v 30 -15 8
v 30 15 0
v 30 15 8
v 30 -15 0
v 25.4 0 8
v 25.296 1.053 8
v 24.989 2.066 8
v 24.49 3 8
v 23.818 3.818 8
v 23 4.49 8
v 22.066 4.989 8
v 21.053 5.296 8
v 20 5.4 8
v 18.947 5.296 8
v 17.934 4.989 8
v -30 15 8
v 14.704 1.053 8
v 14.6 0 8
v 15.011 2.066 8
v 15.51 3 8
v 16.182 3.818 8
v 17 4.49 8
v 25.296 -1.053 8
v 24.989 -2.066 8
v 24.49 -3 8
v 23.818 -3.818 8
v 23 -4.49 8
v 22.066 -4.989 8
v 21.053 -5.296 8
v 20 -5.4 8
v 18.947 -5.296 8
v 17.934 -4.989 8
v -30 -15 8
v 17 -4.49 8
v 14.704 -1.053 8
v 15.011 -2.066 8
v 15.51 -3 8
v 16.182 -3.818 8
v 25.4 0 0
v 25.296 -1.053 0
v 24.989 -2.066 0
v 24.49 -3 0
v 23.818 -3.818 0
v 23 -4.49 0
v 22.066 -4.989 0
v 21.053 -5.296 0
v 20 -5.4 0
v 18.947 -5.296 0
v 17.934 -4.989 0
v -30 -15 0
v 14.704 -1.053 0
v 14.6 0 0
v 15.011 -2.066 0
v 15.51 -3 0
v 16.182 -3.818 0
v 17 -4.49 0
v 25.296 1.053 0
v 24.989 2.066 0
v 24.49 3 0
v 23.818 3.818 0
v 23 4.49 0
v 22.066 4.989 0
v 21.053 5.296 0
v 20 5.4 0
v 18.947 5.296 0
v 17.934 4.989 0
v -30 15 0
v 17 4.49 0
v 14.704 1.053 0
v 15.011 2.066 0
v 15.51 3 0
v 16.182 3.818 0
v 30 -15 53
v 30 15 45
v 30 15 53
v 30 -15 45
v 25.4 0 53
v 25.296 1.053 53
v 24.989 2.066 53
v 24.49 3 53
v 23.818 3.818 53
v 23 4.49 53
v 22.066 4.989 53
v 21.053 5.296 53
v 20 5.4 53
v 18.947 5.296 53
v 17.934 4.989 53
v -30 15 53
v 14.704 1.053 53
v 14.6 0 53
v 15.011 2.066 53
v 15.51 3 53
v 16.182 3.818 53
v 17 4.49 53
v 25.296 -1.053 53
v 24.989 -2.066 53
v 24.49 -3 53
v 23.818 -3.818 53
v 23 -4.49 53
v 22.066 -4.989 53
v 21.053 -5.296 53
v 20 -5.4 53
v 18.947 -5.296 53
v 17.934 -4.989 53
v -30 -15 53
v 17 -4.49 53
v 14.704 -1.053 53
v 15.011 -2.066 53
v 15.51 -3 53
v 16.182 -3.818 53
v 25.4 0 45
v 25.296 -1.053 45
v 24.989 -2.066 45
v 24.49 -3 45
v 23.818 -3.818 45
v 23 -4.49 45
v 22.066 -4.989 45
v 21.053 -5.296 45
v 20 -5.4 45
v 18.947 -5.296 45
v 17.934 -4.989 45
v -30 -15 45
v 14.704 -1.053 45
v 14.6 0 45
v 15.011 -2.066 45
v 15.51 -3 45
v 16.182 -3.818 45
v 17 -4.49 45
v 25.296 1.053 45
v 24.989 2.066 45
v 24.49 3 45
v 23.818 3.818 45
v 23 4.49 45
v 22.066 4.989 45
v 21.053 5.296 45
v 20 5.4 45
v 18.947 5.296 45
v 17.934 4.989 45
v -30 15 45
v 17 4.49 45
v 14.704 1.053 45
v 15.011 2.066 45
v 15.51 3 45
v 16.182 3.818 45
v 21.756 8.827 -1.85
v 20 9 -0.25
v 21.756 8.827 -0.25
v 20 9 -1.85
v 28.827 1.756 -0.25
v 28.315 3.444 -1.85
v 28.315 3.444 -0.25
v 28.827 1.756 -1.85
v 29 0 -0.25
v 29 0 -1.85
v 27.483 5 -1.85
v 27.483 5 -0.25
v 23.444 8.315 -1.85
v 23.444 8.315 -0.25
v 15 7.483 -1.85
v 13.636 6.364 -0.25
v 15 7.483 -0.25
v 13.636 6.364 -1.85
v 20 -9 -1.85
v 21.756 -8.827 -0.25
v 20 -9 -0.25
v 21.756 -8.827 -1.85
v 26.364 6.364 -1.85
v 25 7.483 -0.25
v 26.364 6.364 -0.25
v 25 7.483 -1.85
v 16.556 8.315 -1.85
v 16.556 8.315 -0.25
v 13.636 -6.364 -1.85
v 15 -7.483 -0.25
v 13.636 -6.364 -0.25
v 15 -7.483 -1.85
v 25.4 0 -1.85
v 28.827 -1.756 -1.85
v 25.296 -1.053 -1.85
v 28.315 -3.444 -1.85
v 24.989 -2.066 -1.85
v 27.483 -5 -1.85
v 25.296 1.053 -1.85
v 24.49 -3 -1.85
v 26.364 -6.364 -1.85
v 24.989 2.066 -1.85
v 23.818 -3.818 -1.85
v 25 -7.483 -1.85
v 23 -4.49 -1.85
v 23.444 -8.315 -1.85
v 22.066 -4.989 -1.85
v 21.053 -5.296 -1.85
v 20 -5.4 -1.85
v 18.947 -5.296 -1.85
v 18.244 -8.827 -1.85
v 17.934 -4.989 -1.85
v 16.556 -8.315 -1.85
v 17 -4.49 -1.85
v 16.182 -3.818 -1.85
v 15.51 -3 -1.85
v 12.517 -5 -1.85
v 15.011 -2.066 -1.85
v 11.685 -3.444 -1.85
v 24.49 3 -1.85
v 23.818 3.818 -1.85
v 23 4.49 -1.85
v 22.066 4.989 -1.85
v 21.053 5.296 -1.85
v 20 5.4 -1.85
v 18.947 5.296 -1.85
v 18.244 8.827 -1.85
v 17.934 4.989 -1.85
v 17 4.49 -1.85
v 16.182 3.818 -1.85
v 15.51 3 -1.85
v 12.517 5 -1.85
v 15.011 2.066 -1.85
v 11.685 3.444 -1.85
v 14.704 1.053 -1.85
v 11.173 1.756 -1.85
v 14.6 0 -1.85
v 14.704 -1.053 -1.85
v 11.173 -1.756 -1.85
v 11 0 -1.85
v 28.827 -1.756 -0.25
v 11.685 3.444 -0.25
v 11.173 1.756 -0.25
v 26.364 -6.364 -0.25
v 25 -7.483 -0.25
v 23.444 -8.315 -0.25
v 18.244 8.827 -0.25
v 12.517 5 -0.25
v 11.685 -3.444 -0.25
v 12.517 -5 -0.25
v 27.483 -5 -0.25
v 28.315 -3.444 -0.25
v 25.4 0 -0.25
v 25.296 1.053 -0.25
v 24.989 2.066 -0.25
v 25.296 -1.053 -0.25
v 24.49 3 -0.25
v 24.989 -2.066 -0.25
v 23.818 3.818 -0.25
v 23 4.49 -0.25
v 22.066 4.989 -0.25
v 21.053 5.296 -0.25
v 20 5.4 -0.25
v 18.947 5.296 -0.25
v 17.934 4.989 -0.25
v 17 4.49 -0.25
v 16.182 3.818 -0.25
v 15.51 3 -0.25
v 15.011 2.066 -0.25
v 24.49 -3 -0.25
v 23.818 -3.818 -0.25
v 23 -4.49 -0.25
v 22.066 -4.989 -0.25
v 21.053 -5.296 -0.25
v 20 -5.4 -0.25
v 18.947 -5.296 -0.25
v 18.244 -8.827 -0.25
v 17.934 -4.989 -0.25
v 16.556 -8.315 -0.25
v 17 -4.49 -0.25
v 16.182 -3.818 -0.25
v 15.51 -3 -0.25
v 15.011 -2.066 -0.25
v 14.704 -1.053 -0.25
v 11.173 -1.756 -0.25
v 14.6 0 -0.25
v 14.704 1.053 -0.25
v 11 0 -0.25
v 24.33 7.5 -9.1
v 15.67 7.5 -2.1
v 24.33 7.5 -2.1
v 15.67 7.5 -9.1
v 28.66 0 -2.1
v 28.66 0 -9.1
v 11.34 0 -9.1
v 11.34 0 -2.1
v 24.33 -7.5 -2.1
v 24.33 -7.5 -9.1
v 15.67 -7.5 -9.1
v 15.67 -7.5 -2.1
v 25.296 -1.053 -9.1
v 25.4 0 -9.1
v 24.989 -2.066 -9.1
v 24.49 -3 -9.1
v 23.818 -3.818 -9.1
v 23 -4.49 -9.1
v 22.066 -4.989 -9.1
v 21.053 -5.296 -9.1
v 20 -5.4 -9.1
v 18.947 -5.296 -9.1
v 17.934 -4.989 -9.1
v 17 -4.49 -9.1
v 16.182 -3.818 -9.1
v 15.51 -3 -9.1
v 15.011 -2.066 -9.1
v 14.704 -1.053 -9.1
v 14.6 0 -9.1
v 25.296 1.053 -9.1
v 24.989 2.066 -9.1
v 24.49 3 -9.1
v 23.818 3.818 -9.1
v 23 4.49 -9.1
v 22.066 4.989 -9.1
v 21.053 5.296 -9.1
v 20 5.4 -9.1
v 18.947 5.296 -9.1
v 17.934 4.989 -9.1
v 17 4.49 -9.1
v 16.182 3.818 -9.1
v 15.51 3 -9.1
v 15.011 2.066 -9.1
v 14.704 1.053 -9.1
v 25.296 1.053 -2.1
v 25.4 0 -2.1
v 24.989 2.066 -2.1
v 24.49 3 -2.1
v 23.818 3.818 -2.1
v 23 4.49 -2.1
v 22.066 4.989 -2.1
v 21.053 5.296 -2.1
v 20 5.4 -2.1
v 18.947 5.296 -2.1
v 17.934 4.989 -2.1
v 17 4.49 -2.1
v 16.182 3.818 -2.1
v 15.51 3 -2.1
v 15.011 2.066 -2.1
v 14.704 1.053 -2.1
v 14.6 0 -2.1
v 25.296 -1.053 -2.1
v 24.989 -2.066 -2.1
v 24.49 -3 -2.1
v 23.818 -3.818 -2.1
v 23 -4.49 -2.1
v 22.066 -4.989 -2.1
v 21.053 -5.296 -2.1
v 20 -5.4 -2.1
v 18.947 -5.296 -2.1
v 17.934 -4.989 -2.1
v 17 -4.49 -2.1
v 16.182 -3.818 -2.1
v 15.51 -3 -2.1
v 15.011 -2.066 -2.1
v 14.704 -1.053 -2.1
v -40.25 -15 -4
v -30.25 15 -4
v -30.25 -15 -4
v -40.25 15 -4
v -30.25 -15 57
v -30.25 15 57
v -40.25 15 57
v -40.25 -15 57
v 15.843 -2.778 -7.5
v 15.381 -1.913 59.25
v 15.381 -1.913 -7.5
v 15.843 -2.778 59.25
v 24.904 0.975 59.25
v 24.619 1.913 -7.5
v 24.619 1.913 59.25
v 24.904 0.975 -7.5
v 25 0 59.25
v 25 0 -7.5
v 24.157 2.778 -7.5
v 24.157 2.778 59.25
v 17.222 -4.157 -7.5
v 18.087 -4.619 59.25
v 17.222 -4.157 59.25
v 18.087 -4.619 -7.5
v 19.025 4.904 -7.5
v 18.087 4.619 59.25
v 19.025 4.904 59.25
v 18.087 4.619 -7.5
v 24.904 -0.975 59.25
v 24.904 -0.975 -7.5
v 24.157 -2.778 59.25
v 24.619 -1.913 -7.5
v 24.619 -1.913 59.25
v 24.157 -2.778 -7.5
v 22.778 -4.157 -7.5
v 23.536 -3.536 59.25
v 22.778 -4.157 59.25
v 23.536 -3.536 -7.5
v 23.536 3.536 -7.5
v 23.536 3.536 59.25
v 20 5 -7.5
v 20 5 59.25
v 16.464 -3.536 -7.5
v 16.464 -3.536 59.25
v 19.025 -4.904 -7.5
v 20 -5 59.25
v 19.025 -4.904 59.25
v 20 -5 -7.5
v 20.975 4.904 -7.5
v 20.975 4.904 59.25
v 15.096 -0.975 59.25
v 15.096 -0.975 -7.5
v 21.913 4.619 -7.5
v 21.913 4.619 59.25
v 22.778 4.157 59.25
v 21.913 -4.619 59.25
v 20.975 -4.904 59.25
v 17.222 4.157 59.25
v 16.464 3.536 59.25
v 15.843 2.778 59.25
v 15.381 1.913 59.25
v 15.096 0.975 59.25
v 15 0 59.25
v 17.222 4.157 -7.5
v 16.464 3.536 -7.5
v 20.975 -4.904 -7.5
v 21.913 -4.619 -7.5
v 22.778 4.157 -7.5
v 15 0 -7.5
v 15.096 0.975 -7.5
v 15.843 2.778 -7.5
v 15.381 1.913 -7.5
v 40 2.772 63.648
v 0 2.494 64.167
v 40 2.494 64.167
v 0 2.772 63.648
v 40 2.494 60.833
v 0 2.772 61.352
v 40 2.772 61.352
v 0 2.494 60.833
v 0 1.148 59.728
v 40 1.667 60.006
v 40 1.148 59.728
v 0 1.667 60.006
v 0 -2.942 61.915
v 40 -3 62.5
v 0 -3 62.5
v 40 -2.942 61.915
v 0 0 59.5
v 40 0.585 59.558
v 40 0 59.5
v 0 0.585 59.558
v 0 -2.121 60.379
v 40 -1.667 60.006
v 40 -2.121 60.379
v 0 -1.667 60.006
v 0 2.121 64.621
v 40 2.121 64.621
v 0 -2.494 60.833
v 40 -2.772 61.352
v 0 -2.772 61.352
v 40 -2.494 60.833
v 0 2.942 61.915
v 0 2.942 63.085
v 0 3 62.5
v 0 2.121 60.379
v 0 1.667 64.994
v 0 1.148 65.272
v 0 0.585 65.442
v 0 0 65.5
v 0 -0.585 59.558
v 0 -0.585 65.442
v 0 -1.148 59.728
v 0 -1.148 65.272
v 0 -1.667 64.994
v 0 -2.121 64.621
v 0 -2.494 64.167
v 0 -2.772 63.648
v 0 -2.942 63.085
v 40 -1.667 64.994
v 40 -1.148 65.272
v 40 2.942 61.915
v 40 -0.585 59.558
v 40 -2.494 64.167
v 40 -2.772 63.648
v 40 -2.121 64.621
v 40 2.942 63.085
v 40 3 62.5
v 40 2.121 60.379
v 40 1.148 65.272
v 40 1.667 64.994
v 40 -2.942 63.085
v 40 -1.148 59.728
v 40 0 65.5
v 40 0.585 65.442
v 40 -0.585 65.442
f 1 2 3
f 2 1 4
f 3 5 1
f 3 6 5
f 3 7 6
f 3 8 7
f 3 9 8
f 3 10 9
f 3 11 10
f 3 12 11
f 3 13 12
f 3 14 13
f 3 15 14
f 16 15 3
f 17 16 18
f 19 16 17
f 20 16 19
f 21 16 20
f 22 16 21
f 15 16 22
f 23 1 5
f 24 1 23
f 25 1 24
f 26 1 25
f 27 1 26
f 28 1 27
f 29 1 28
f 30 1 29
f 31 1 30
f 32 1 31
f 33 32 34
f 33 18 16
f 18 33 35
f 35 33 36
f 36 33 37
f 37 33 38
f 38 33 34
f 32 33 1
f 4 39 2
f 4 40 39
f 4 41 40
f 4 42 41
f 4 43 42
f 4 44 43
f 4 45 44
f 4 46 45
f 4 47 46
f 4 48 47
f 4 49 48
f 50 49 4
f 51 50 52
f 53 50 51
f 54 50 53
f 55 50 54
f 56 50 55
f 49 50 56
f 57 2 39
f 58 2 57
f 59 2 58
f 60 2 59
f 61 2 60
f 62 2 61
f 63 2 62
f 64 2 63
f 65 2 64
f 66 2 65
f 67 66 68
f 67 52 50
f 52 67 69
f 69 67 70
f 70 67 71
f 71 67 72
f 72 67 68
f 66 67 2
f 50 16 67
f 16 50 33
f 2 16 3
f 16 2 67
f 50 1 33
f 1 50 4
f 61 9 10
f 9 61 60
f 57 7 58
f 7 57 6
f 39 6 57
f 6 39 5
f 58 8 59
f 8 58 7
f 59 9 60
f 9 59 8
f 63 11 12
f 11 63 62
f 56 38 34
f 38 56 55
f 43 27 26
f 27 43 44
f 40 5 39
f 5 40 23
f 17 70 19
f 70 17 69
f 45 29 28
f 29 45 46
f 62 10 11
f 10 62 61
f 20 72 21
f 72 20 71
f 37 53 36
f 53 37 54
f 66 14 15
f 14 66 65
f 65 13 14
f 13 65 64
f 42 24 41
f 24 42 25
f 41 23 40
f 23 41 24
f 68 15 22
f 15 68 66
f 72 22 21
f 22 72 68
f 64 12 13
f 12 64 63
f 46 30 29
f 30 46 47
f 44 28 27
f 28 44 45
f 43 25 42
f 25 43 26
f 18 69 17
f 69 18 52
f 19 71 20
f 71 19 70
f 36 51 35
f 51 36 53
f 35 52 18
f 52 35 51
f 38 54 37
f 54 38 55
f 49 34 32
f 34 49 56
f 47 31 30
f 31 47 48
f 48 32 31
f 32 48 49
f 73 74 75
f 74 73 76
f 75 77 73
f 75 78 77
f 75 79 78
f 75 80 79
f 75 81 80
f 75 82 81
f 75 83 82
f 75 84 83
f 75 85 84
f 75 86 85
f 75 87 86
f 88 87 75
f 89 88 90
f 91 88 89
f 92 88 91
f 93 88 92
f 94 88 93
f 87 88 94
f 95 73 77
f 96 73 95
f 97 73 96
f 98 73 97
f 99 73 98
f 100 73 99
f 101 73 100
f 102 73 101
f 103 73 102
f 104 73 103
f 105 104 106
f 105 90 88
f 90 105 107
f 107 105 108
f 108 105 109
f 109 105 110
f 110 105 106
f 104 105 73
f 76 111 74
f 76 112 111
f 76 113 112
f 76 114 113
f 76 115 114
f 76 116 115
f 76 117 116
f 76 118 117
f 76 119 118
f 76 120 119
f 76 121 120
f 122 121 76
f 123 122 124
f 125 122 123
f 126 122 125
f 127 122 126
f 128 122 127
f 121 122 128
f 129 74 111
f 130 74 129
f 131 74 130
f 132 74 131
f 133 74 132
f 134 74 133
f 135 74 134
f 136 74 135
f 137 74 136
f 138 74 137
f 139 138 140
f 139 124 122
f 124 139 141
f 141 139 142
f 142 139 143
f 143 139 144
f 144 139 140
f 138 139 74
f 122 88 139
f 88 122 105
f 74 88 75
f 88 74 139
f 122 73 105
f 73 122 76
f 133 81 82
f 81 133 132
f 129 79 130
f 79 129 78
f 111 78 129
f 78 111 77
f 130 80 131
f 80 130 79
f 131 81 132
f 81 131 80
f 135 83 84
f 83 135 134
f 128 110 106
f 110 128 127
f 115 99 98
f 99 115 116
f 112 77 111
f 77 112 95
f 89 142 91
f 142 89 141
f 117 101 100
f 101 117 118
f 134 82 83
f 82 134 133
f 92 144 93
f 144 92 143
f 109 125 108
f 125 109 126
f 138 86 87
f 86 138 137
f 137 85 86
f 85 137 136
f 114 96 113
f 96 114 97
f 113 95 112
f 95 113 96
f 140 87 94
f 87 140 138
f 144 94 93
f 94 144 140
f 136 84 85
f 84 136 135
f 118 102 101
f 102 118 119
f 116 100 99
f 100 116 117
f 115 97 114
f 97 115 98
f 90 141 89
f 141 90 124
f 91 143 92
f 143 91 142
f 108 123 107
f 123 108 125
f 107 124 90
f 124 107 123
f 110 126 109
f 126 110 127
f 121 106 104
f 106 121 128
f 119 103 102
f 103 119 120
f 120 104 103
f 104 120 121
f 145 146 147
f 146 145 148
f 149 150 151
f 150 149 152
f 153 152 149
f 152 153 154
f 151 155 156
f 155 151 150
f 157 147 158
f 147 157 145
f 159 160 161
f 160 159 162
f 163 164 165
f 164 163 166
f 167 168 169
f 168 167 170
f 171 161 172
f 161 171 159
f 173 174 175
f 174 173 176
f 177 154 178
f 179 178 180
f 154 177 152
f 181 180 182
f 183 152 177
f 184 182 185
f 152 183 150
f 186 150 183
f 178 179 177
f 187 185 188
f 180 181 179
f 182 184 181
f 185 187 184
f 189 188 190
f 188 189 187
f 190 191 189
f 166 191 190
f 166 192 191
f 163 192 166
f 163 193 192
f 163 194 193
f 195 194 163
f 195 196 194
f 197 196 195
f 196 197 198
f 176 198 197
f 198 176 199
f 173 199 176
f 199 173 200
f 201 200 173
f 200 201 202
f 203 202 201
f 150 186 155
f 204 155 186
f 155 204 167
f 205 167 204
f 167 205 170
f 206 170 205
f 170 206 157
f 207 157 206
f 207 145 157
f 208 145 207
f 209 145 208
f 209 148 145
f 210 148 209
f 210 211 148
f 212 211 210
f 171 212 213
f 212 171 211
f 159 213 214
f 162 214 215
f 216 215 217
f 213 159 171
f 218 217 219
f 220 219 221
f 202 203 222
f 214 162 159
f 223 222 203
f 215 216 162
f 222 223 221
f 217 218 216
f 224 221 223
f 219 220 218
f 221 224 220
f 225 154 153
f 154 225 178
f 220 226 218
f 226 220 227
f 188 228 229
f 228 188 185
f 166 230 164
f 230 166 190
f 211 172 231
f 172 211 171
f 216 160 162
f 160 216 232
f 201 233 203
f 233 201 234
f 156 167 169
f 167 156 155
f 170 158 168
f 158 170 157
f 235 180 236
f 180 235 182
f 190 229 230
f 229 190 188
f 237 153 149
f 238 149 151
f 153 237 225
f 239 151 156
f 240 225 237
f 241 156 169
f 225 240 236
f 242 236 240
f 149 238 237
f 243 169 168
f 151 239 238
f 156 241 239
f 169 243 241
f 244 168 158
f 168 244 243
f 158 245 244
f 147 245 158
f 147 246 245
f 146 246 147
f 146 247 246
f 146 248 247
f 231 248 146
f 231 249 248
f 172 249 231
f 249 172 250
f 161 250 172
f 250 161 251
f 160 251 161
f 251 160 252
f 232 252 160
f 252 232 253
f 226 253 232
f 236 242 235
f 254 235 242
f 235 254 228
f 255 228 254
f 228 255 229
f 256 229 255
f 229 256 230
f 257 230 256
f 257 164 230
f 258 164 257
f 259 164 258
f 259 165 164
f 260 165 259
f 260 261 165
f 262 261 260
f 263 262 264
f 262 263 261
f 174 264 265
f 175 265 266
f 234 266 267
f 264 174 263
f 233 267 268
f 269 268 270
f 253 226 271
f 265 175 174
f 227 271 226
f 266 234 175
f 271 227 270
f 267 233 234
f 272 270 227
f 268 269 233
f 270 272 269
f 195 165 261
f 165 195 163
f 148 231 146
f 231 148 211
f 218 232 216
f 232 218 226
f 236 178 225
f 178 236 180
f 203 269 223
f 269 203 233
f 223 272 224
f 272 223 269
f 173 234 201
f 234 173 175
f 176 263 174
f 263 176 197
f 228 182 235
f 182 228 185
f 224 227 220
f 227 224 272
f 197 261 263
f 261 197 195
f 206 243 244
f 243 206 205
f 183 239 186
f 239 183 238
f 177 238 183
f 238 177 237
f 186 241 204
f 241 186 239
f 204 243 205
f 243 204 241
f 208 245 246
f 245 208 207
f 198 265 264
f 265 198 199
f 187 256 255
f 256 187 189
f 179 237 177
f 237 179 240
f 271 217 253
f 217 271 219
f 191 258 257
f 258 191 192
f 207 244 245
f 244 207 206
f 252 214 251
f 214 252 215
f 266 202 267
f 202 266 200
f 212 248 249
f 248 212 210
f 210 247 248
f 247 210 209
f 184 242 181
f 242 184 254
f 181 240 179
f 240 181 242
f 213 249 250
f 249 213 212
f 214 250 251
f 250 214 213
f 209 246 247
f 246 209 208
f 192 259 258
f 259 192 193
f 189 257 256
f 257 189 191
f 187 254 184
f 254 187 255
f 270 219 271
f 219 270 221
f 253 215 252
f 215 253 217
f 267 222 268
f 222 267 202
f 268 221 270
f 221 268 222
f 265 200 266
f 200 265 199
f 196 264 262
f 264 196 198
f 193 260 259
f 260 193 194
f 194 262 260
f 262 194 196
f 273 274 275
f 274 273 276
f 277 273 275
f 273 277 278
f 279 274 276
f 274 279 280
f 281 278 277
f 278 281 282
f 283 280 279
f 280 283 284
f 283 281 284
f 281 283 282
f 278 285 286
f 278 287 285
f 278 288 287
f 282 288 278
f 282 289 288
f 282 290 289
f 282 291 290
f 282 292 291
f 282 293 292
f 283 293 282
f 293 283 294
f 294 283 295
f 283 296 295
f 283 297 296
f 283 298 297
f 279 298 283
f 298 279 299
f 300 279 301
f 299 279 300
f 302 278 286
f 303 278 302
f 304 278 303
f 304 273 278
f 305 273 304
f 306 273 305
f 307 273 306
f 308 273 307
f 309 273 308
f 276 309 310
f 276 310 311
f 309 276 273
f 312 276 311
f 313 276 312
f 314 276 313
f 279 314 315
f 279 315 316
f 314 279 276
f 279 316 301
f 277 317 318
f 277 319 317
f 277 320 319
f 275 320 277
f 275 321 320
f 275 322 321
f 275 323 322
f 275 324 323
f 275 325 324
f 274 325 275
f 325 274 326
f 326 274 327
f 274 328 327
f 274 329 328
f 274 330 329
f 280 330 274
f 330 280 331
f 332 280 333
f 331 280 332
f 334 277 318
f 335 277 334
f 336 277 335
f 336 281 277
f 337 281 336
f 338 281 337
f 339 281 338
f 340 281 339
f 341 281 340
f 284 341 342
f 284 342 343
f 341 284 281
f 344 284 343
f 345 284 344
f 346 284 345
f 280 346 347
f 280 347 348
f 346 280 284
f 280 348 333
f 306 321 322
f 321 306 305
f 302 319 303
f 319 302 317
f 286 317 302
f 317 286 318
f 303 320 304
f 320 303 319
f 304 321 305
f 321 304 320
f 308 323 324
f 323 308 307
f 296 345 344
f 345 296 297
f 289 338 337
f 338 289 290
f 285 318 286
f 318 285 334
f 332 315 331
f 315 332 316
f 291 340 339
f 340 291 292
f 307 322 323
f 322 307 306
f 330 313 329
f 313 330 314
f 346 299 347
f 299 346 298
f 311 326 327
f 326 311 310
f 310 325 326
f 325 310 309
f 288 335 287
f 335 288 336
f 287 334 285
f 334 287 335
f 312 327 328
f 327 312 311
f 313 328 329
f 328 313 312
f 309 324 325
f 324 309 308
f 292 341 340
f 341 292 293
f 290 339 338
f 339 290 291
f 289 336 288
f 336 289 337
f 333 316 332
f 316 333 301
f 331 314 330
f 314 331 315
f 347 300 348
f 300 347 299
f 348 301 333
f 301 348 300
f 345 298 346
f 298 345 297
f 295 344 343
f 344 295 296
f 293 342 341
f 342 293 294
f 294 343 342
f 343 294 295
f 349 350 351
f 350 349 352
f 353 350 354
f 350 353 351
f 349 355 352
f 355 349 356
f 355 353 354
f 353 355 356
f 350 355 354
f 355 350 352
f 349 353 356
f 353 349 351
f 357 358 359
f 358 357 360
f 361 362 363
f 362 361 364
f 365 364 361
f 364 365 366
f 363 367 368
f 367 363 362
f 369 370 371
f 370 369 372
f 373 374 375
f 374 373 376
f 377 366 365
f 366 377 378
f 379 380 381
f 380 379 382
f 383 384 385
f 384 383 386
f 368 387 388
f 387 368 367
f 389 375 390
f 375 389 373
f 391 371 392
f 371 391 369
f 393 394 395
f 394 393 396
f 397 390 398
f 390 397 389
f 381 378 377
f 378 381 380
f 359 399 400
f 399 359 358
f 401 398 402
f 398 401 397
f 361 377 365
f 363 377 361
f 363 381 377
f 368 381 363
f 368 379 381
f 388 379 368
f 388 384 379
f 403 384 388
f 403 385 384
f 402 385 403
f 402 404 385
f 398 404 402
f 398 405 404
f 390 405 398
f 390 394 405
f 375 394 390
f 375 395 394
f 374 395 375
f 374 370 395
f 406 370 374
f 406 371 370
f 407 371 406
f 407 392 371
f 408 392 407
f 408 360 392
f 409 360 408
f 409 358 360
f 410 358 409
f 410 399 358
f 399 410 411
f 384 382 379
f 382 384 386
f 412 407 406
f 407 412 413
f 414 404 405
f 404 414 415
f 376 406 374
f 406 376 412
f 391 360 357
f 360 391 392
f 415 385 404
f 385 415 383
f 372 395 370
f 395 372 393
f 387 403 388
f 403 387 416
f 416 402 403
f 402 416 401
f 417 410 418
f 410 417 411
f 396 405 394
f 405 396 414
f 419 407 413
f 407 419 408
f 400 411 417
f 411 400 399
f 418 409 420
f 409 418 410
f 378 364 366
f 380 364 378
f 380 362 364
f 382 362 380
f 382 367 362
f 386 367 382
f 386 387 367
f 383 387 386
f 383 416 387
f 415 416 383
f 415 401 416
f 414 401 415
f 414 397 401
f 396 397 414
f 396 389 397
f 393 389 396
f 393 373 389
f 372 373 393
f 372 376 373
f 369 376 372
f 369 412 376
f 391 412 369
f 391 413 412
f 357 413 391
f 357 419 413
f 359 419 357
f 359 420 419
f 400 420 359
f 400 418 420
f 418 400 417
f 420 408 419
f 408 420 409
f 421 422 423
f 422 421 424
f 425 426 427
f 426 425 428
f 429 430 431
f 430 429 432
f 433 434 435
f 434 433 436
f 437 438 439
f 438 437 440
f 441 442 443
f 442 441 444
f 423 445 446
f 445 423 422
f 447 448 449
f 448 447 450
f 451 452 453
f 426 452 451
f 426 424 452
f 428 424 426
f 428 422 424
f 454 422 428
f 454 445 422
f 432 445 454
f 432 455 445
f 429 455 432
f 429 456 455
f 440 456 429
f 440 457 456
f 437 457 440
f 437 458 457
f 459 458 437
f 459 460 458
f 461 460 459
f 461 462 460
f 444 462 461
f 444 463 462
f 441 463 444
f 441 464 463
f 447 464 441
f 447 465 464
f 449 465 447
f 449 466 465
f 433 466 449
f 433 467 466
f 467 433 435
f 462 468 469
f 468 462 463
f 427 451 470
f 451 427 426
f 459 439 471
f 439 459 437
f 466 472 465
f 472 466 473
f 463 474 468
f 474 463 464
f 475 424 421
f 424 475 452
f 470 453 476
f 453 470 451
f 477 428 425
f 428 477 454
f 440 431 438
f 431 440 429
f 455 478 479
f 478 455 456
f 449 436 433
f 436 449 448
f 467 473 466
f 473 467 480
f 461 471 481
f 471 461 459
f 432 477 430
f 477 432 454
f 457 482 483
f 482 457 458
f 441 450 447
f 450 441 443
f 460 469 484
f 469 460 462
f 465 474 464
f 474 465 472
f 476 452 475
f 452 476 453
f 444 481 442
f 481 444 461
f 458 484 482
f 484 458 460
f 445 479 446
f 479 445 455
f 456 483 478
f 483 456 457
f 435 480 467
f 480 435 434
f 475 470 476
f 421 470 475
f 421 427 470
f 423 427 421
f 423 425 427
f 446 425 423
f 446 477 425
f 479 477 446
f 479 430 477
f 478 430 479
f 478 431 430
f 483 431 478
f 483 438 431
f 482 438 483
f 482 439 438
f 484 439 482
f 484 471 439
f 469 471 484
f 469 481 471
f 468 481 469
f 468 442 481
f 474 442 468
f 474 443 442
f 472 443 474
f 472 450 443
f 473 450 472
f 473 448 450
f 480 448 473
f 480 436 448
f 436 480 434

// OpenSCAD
$fn = 32;

// ------------------------------------------------------------------------
// C clamp: throat 45 mm, screw d10
// Every part is its own module, assembly() places every instance.
// ------------------------------------------------------------------------

// --- part 1 ---
module clamp_arm() {
  difference() {
    translate([-30, -15, 0]) cube([60, 30, 8]);
    translate([20, 0, -1]) cylinder(h = 10, d = 10.8);
  }
}

// --- part 2 ---
module clamp_spine() {
  difference() {
    translate([-30.5, -15, 0]) cube([61, 30, 10]);
  }
}

// --- part 3 ---
module clamp_screw() {
  translate([0, 0, -33.375]) cylinder(h = 66.75, d = 10);
}

// --- part 4 ---
module clamp_washer() {
  difference() {
      translate([0, 0, 0]) cylinder(h = 1.6, d = 18);
      translate([0, 0, -1]) cylinder(h = 3.6, d = 10.8);
    }
}

// --- part 5 ---
module clamp_nut() {
  difference() {
    linear_extrude(height = 7) polygon(points = [[8.66, 0], [4.33, 7.5], [-4.33, 7.5], [-8.66, 0], [-4.33, -7.5], [4.33, -7.5]]);
    translate([0, 0, -1]) cylinder(h = 9, d = 10.8);
  }
}

// --- part 6 ---
module tommy_bar() {
  translate([0, 0, -20]) cylinder(h = 40, d = 6);
}

// --- assembly ---
module assembly() {
  color([0.80, 0.24, 0.20]) translate([0, 0, 0]) rotate([0, 0, 0]) clamp_arm();
  color([0.20, 0.45, 0.75]) translate([0, 0, 45]) rotate([0, 0, 0]) clamp_arm();
  color([0.25, 0.62, 0.32]) translate([-40.25, 0, 26.5]) rotate([0, 90, 0]) clamp_spine();
  color([0.92, 0.70, 0.18]) translate([20, 0, 25.875]) rotate([0, 0, 0]) clamp_screw();
  color([0.58, 0.35, 0.70]) translate([20, 0, -1.85]) rotate([0, 0, 0]) clamp_washer();
  color([0.16, 0.66, 0.66]) translate([20, 0, -9.1]) rotate([0, 0, 0]) clamp_nut();
  color([0.85, 0.48, 0.18]) translate([20, 0, 62.5]) rotate([0, 90, 0]) tommy_bar();
}

assembly();
